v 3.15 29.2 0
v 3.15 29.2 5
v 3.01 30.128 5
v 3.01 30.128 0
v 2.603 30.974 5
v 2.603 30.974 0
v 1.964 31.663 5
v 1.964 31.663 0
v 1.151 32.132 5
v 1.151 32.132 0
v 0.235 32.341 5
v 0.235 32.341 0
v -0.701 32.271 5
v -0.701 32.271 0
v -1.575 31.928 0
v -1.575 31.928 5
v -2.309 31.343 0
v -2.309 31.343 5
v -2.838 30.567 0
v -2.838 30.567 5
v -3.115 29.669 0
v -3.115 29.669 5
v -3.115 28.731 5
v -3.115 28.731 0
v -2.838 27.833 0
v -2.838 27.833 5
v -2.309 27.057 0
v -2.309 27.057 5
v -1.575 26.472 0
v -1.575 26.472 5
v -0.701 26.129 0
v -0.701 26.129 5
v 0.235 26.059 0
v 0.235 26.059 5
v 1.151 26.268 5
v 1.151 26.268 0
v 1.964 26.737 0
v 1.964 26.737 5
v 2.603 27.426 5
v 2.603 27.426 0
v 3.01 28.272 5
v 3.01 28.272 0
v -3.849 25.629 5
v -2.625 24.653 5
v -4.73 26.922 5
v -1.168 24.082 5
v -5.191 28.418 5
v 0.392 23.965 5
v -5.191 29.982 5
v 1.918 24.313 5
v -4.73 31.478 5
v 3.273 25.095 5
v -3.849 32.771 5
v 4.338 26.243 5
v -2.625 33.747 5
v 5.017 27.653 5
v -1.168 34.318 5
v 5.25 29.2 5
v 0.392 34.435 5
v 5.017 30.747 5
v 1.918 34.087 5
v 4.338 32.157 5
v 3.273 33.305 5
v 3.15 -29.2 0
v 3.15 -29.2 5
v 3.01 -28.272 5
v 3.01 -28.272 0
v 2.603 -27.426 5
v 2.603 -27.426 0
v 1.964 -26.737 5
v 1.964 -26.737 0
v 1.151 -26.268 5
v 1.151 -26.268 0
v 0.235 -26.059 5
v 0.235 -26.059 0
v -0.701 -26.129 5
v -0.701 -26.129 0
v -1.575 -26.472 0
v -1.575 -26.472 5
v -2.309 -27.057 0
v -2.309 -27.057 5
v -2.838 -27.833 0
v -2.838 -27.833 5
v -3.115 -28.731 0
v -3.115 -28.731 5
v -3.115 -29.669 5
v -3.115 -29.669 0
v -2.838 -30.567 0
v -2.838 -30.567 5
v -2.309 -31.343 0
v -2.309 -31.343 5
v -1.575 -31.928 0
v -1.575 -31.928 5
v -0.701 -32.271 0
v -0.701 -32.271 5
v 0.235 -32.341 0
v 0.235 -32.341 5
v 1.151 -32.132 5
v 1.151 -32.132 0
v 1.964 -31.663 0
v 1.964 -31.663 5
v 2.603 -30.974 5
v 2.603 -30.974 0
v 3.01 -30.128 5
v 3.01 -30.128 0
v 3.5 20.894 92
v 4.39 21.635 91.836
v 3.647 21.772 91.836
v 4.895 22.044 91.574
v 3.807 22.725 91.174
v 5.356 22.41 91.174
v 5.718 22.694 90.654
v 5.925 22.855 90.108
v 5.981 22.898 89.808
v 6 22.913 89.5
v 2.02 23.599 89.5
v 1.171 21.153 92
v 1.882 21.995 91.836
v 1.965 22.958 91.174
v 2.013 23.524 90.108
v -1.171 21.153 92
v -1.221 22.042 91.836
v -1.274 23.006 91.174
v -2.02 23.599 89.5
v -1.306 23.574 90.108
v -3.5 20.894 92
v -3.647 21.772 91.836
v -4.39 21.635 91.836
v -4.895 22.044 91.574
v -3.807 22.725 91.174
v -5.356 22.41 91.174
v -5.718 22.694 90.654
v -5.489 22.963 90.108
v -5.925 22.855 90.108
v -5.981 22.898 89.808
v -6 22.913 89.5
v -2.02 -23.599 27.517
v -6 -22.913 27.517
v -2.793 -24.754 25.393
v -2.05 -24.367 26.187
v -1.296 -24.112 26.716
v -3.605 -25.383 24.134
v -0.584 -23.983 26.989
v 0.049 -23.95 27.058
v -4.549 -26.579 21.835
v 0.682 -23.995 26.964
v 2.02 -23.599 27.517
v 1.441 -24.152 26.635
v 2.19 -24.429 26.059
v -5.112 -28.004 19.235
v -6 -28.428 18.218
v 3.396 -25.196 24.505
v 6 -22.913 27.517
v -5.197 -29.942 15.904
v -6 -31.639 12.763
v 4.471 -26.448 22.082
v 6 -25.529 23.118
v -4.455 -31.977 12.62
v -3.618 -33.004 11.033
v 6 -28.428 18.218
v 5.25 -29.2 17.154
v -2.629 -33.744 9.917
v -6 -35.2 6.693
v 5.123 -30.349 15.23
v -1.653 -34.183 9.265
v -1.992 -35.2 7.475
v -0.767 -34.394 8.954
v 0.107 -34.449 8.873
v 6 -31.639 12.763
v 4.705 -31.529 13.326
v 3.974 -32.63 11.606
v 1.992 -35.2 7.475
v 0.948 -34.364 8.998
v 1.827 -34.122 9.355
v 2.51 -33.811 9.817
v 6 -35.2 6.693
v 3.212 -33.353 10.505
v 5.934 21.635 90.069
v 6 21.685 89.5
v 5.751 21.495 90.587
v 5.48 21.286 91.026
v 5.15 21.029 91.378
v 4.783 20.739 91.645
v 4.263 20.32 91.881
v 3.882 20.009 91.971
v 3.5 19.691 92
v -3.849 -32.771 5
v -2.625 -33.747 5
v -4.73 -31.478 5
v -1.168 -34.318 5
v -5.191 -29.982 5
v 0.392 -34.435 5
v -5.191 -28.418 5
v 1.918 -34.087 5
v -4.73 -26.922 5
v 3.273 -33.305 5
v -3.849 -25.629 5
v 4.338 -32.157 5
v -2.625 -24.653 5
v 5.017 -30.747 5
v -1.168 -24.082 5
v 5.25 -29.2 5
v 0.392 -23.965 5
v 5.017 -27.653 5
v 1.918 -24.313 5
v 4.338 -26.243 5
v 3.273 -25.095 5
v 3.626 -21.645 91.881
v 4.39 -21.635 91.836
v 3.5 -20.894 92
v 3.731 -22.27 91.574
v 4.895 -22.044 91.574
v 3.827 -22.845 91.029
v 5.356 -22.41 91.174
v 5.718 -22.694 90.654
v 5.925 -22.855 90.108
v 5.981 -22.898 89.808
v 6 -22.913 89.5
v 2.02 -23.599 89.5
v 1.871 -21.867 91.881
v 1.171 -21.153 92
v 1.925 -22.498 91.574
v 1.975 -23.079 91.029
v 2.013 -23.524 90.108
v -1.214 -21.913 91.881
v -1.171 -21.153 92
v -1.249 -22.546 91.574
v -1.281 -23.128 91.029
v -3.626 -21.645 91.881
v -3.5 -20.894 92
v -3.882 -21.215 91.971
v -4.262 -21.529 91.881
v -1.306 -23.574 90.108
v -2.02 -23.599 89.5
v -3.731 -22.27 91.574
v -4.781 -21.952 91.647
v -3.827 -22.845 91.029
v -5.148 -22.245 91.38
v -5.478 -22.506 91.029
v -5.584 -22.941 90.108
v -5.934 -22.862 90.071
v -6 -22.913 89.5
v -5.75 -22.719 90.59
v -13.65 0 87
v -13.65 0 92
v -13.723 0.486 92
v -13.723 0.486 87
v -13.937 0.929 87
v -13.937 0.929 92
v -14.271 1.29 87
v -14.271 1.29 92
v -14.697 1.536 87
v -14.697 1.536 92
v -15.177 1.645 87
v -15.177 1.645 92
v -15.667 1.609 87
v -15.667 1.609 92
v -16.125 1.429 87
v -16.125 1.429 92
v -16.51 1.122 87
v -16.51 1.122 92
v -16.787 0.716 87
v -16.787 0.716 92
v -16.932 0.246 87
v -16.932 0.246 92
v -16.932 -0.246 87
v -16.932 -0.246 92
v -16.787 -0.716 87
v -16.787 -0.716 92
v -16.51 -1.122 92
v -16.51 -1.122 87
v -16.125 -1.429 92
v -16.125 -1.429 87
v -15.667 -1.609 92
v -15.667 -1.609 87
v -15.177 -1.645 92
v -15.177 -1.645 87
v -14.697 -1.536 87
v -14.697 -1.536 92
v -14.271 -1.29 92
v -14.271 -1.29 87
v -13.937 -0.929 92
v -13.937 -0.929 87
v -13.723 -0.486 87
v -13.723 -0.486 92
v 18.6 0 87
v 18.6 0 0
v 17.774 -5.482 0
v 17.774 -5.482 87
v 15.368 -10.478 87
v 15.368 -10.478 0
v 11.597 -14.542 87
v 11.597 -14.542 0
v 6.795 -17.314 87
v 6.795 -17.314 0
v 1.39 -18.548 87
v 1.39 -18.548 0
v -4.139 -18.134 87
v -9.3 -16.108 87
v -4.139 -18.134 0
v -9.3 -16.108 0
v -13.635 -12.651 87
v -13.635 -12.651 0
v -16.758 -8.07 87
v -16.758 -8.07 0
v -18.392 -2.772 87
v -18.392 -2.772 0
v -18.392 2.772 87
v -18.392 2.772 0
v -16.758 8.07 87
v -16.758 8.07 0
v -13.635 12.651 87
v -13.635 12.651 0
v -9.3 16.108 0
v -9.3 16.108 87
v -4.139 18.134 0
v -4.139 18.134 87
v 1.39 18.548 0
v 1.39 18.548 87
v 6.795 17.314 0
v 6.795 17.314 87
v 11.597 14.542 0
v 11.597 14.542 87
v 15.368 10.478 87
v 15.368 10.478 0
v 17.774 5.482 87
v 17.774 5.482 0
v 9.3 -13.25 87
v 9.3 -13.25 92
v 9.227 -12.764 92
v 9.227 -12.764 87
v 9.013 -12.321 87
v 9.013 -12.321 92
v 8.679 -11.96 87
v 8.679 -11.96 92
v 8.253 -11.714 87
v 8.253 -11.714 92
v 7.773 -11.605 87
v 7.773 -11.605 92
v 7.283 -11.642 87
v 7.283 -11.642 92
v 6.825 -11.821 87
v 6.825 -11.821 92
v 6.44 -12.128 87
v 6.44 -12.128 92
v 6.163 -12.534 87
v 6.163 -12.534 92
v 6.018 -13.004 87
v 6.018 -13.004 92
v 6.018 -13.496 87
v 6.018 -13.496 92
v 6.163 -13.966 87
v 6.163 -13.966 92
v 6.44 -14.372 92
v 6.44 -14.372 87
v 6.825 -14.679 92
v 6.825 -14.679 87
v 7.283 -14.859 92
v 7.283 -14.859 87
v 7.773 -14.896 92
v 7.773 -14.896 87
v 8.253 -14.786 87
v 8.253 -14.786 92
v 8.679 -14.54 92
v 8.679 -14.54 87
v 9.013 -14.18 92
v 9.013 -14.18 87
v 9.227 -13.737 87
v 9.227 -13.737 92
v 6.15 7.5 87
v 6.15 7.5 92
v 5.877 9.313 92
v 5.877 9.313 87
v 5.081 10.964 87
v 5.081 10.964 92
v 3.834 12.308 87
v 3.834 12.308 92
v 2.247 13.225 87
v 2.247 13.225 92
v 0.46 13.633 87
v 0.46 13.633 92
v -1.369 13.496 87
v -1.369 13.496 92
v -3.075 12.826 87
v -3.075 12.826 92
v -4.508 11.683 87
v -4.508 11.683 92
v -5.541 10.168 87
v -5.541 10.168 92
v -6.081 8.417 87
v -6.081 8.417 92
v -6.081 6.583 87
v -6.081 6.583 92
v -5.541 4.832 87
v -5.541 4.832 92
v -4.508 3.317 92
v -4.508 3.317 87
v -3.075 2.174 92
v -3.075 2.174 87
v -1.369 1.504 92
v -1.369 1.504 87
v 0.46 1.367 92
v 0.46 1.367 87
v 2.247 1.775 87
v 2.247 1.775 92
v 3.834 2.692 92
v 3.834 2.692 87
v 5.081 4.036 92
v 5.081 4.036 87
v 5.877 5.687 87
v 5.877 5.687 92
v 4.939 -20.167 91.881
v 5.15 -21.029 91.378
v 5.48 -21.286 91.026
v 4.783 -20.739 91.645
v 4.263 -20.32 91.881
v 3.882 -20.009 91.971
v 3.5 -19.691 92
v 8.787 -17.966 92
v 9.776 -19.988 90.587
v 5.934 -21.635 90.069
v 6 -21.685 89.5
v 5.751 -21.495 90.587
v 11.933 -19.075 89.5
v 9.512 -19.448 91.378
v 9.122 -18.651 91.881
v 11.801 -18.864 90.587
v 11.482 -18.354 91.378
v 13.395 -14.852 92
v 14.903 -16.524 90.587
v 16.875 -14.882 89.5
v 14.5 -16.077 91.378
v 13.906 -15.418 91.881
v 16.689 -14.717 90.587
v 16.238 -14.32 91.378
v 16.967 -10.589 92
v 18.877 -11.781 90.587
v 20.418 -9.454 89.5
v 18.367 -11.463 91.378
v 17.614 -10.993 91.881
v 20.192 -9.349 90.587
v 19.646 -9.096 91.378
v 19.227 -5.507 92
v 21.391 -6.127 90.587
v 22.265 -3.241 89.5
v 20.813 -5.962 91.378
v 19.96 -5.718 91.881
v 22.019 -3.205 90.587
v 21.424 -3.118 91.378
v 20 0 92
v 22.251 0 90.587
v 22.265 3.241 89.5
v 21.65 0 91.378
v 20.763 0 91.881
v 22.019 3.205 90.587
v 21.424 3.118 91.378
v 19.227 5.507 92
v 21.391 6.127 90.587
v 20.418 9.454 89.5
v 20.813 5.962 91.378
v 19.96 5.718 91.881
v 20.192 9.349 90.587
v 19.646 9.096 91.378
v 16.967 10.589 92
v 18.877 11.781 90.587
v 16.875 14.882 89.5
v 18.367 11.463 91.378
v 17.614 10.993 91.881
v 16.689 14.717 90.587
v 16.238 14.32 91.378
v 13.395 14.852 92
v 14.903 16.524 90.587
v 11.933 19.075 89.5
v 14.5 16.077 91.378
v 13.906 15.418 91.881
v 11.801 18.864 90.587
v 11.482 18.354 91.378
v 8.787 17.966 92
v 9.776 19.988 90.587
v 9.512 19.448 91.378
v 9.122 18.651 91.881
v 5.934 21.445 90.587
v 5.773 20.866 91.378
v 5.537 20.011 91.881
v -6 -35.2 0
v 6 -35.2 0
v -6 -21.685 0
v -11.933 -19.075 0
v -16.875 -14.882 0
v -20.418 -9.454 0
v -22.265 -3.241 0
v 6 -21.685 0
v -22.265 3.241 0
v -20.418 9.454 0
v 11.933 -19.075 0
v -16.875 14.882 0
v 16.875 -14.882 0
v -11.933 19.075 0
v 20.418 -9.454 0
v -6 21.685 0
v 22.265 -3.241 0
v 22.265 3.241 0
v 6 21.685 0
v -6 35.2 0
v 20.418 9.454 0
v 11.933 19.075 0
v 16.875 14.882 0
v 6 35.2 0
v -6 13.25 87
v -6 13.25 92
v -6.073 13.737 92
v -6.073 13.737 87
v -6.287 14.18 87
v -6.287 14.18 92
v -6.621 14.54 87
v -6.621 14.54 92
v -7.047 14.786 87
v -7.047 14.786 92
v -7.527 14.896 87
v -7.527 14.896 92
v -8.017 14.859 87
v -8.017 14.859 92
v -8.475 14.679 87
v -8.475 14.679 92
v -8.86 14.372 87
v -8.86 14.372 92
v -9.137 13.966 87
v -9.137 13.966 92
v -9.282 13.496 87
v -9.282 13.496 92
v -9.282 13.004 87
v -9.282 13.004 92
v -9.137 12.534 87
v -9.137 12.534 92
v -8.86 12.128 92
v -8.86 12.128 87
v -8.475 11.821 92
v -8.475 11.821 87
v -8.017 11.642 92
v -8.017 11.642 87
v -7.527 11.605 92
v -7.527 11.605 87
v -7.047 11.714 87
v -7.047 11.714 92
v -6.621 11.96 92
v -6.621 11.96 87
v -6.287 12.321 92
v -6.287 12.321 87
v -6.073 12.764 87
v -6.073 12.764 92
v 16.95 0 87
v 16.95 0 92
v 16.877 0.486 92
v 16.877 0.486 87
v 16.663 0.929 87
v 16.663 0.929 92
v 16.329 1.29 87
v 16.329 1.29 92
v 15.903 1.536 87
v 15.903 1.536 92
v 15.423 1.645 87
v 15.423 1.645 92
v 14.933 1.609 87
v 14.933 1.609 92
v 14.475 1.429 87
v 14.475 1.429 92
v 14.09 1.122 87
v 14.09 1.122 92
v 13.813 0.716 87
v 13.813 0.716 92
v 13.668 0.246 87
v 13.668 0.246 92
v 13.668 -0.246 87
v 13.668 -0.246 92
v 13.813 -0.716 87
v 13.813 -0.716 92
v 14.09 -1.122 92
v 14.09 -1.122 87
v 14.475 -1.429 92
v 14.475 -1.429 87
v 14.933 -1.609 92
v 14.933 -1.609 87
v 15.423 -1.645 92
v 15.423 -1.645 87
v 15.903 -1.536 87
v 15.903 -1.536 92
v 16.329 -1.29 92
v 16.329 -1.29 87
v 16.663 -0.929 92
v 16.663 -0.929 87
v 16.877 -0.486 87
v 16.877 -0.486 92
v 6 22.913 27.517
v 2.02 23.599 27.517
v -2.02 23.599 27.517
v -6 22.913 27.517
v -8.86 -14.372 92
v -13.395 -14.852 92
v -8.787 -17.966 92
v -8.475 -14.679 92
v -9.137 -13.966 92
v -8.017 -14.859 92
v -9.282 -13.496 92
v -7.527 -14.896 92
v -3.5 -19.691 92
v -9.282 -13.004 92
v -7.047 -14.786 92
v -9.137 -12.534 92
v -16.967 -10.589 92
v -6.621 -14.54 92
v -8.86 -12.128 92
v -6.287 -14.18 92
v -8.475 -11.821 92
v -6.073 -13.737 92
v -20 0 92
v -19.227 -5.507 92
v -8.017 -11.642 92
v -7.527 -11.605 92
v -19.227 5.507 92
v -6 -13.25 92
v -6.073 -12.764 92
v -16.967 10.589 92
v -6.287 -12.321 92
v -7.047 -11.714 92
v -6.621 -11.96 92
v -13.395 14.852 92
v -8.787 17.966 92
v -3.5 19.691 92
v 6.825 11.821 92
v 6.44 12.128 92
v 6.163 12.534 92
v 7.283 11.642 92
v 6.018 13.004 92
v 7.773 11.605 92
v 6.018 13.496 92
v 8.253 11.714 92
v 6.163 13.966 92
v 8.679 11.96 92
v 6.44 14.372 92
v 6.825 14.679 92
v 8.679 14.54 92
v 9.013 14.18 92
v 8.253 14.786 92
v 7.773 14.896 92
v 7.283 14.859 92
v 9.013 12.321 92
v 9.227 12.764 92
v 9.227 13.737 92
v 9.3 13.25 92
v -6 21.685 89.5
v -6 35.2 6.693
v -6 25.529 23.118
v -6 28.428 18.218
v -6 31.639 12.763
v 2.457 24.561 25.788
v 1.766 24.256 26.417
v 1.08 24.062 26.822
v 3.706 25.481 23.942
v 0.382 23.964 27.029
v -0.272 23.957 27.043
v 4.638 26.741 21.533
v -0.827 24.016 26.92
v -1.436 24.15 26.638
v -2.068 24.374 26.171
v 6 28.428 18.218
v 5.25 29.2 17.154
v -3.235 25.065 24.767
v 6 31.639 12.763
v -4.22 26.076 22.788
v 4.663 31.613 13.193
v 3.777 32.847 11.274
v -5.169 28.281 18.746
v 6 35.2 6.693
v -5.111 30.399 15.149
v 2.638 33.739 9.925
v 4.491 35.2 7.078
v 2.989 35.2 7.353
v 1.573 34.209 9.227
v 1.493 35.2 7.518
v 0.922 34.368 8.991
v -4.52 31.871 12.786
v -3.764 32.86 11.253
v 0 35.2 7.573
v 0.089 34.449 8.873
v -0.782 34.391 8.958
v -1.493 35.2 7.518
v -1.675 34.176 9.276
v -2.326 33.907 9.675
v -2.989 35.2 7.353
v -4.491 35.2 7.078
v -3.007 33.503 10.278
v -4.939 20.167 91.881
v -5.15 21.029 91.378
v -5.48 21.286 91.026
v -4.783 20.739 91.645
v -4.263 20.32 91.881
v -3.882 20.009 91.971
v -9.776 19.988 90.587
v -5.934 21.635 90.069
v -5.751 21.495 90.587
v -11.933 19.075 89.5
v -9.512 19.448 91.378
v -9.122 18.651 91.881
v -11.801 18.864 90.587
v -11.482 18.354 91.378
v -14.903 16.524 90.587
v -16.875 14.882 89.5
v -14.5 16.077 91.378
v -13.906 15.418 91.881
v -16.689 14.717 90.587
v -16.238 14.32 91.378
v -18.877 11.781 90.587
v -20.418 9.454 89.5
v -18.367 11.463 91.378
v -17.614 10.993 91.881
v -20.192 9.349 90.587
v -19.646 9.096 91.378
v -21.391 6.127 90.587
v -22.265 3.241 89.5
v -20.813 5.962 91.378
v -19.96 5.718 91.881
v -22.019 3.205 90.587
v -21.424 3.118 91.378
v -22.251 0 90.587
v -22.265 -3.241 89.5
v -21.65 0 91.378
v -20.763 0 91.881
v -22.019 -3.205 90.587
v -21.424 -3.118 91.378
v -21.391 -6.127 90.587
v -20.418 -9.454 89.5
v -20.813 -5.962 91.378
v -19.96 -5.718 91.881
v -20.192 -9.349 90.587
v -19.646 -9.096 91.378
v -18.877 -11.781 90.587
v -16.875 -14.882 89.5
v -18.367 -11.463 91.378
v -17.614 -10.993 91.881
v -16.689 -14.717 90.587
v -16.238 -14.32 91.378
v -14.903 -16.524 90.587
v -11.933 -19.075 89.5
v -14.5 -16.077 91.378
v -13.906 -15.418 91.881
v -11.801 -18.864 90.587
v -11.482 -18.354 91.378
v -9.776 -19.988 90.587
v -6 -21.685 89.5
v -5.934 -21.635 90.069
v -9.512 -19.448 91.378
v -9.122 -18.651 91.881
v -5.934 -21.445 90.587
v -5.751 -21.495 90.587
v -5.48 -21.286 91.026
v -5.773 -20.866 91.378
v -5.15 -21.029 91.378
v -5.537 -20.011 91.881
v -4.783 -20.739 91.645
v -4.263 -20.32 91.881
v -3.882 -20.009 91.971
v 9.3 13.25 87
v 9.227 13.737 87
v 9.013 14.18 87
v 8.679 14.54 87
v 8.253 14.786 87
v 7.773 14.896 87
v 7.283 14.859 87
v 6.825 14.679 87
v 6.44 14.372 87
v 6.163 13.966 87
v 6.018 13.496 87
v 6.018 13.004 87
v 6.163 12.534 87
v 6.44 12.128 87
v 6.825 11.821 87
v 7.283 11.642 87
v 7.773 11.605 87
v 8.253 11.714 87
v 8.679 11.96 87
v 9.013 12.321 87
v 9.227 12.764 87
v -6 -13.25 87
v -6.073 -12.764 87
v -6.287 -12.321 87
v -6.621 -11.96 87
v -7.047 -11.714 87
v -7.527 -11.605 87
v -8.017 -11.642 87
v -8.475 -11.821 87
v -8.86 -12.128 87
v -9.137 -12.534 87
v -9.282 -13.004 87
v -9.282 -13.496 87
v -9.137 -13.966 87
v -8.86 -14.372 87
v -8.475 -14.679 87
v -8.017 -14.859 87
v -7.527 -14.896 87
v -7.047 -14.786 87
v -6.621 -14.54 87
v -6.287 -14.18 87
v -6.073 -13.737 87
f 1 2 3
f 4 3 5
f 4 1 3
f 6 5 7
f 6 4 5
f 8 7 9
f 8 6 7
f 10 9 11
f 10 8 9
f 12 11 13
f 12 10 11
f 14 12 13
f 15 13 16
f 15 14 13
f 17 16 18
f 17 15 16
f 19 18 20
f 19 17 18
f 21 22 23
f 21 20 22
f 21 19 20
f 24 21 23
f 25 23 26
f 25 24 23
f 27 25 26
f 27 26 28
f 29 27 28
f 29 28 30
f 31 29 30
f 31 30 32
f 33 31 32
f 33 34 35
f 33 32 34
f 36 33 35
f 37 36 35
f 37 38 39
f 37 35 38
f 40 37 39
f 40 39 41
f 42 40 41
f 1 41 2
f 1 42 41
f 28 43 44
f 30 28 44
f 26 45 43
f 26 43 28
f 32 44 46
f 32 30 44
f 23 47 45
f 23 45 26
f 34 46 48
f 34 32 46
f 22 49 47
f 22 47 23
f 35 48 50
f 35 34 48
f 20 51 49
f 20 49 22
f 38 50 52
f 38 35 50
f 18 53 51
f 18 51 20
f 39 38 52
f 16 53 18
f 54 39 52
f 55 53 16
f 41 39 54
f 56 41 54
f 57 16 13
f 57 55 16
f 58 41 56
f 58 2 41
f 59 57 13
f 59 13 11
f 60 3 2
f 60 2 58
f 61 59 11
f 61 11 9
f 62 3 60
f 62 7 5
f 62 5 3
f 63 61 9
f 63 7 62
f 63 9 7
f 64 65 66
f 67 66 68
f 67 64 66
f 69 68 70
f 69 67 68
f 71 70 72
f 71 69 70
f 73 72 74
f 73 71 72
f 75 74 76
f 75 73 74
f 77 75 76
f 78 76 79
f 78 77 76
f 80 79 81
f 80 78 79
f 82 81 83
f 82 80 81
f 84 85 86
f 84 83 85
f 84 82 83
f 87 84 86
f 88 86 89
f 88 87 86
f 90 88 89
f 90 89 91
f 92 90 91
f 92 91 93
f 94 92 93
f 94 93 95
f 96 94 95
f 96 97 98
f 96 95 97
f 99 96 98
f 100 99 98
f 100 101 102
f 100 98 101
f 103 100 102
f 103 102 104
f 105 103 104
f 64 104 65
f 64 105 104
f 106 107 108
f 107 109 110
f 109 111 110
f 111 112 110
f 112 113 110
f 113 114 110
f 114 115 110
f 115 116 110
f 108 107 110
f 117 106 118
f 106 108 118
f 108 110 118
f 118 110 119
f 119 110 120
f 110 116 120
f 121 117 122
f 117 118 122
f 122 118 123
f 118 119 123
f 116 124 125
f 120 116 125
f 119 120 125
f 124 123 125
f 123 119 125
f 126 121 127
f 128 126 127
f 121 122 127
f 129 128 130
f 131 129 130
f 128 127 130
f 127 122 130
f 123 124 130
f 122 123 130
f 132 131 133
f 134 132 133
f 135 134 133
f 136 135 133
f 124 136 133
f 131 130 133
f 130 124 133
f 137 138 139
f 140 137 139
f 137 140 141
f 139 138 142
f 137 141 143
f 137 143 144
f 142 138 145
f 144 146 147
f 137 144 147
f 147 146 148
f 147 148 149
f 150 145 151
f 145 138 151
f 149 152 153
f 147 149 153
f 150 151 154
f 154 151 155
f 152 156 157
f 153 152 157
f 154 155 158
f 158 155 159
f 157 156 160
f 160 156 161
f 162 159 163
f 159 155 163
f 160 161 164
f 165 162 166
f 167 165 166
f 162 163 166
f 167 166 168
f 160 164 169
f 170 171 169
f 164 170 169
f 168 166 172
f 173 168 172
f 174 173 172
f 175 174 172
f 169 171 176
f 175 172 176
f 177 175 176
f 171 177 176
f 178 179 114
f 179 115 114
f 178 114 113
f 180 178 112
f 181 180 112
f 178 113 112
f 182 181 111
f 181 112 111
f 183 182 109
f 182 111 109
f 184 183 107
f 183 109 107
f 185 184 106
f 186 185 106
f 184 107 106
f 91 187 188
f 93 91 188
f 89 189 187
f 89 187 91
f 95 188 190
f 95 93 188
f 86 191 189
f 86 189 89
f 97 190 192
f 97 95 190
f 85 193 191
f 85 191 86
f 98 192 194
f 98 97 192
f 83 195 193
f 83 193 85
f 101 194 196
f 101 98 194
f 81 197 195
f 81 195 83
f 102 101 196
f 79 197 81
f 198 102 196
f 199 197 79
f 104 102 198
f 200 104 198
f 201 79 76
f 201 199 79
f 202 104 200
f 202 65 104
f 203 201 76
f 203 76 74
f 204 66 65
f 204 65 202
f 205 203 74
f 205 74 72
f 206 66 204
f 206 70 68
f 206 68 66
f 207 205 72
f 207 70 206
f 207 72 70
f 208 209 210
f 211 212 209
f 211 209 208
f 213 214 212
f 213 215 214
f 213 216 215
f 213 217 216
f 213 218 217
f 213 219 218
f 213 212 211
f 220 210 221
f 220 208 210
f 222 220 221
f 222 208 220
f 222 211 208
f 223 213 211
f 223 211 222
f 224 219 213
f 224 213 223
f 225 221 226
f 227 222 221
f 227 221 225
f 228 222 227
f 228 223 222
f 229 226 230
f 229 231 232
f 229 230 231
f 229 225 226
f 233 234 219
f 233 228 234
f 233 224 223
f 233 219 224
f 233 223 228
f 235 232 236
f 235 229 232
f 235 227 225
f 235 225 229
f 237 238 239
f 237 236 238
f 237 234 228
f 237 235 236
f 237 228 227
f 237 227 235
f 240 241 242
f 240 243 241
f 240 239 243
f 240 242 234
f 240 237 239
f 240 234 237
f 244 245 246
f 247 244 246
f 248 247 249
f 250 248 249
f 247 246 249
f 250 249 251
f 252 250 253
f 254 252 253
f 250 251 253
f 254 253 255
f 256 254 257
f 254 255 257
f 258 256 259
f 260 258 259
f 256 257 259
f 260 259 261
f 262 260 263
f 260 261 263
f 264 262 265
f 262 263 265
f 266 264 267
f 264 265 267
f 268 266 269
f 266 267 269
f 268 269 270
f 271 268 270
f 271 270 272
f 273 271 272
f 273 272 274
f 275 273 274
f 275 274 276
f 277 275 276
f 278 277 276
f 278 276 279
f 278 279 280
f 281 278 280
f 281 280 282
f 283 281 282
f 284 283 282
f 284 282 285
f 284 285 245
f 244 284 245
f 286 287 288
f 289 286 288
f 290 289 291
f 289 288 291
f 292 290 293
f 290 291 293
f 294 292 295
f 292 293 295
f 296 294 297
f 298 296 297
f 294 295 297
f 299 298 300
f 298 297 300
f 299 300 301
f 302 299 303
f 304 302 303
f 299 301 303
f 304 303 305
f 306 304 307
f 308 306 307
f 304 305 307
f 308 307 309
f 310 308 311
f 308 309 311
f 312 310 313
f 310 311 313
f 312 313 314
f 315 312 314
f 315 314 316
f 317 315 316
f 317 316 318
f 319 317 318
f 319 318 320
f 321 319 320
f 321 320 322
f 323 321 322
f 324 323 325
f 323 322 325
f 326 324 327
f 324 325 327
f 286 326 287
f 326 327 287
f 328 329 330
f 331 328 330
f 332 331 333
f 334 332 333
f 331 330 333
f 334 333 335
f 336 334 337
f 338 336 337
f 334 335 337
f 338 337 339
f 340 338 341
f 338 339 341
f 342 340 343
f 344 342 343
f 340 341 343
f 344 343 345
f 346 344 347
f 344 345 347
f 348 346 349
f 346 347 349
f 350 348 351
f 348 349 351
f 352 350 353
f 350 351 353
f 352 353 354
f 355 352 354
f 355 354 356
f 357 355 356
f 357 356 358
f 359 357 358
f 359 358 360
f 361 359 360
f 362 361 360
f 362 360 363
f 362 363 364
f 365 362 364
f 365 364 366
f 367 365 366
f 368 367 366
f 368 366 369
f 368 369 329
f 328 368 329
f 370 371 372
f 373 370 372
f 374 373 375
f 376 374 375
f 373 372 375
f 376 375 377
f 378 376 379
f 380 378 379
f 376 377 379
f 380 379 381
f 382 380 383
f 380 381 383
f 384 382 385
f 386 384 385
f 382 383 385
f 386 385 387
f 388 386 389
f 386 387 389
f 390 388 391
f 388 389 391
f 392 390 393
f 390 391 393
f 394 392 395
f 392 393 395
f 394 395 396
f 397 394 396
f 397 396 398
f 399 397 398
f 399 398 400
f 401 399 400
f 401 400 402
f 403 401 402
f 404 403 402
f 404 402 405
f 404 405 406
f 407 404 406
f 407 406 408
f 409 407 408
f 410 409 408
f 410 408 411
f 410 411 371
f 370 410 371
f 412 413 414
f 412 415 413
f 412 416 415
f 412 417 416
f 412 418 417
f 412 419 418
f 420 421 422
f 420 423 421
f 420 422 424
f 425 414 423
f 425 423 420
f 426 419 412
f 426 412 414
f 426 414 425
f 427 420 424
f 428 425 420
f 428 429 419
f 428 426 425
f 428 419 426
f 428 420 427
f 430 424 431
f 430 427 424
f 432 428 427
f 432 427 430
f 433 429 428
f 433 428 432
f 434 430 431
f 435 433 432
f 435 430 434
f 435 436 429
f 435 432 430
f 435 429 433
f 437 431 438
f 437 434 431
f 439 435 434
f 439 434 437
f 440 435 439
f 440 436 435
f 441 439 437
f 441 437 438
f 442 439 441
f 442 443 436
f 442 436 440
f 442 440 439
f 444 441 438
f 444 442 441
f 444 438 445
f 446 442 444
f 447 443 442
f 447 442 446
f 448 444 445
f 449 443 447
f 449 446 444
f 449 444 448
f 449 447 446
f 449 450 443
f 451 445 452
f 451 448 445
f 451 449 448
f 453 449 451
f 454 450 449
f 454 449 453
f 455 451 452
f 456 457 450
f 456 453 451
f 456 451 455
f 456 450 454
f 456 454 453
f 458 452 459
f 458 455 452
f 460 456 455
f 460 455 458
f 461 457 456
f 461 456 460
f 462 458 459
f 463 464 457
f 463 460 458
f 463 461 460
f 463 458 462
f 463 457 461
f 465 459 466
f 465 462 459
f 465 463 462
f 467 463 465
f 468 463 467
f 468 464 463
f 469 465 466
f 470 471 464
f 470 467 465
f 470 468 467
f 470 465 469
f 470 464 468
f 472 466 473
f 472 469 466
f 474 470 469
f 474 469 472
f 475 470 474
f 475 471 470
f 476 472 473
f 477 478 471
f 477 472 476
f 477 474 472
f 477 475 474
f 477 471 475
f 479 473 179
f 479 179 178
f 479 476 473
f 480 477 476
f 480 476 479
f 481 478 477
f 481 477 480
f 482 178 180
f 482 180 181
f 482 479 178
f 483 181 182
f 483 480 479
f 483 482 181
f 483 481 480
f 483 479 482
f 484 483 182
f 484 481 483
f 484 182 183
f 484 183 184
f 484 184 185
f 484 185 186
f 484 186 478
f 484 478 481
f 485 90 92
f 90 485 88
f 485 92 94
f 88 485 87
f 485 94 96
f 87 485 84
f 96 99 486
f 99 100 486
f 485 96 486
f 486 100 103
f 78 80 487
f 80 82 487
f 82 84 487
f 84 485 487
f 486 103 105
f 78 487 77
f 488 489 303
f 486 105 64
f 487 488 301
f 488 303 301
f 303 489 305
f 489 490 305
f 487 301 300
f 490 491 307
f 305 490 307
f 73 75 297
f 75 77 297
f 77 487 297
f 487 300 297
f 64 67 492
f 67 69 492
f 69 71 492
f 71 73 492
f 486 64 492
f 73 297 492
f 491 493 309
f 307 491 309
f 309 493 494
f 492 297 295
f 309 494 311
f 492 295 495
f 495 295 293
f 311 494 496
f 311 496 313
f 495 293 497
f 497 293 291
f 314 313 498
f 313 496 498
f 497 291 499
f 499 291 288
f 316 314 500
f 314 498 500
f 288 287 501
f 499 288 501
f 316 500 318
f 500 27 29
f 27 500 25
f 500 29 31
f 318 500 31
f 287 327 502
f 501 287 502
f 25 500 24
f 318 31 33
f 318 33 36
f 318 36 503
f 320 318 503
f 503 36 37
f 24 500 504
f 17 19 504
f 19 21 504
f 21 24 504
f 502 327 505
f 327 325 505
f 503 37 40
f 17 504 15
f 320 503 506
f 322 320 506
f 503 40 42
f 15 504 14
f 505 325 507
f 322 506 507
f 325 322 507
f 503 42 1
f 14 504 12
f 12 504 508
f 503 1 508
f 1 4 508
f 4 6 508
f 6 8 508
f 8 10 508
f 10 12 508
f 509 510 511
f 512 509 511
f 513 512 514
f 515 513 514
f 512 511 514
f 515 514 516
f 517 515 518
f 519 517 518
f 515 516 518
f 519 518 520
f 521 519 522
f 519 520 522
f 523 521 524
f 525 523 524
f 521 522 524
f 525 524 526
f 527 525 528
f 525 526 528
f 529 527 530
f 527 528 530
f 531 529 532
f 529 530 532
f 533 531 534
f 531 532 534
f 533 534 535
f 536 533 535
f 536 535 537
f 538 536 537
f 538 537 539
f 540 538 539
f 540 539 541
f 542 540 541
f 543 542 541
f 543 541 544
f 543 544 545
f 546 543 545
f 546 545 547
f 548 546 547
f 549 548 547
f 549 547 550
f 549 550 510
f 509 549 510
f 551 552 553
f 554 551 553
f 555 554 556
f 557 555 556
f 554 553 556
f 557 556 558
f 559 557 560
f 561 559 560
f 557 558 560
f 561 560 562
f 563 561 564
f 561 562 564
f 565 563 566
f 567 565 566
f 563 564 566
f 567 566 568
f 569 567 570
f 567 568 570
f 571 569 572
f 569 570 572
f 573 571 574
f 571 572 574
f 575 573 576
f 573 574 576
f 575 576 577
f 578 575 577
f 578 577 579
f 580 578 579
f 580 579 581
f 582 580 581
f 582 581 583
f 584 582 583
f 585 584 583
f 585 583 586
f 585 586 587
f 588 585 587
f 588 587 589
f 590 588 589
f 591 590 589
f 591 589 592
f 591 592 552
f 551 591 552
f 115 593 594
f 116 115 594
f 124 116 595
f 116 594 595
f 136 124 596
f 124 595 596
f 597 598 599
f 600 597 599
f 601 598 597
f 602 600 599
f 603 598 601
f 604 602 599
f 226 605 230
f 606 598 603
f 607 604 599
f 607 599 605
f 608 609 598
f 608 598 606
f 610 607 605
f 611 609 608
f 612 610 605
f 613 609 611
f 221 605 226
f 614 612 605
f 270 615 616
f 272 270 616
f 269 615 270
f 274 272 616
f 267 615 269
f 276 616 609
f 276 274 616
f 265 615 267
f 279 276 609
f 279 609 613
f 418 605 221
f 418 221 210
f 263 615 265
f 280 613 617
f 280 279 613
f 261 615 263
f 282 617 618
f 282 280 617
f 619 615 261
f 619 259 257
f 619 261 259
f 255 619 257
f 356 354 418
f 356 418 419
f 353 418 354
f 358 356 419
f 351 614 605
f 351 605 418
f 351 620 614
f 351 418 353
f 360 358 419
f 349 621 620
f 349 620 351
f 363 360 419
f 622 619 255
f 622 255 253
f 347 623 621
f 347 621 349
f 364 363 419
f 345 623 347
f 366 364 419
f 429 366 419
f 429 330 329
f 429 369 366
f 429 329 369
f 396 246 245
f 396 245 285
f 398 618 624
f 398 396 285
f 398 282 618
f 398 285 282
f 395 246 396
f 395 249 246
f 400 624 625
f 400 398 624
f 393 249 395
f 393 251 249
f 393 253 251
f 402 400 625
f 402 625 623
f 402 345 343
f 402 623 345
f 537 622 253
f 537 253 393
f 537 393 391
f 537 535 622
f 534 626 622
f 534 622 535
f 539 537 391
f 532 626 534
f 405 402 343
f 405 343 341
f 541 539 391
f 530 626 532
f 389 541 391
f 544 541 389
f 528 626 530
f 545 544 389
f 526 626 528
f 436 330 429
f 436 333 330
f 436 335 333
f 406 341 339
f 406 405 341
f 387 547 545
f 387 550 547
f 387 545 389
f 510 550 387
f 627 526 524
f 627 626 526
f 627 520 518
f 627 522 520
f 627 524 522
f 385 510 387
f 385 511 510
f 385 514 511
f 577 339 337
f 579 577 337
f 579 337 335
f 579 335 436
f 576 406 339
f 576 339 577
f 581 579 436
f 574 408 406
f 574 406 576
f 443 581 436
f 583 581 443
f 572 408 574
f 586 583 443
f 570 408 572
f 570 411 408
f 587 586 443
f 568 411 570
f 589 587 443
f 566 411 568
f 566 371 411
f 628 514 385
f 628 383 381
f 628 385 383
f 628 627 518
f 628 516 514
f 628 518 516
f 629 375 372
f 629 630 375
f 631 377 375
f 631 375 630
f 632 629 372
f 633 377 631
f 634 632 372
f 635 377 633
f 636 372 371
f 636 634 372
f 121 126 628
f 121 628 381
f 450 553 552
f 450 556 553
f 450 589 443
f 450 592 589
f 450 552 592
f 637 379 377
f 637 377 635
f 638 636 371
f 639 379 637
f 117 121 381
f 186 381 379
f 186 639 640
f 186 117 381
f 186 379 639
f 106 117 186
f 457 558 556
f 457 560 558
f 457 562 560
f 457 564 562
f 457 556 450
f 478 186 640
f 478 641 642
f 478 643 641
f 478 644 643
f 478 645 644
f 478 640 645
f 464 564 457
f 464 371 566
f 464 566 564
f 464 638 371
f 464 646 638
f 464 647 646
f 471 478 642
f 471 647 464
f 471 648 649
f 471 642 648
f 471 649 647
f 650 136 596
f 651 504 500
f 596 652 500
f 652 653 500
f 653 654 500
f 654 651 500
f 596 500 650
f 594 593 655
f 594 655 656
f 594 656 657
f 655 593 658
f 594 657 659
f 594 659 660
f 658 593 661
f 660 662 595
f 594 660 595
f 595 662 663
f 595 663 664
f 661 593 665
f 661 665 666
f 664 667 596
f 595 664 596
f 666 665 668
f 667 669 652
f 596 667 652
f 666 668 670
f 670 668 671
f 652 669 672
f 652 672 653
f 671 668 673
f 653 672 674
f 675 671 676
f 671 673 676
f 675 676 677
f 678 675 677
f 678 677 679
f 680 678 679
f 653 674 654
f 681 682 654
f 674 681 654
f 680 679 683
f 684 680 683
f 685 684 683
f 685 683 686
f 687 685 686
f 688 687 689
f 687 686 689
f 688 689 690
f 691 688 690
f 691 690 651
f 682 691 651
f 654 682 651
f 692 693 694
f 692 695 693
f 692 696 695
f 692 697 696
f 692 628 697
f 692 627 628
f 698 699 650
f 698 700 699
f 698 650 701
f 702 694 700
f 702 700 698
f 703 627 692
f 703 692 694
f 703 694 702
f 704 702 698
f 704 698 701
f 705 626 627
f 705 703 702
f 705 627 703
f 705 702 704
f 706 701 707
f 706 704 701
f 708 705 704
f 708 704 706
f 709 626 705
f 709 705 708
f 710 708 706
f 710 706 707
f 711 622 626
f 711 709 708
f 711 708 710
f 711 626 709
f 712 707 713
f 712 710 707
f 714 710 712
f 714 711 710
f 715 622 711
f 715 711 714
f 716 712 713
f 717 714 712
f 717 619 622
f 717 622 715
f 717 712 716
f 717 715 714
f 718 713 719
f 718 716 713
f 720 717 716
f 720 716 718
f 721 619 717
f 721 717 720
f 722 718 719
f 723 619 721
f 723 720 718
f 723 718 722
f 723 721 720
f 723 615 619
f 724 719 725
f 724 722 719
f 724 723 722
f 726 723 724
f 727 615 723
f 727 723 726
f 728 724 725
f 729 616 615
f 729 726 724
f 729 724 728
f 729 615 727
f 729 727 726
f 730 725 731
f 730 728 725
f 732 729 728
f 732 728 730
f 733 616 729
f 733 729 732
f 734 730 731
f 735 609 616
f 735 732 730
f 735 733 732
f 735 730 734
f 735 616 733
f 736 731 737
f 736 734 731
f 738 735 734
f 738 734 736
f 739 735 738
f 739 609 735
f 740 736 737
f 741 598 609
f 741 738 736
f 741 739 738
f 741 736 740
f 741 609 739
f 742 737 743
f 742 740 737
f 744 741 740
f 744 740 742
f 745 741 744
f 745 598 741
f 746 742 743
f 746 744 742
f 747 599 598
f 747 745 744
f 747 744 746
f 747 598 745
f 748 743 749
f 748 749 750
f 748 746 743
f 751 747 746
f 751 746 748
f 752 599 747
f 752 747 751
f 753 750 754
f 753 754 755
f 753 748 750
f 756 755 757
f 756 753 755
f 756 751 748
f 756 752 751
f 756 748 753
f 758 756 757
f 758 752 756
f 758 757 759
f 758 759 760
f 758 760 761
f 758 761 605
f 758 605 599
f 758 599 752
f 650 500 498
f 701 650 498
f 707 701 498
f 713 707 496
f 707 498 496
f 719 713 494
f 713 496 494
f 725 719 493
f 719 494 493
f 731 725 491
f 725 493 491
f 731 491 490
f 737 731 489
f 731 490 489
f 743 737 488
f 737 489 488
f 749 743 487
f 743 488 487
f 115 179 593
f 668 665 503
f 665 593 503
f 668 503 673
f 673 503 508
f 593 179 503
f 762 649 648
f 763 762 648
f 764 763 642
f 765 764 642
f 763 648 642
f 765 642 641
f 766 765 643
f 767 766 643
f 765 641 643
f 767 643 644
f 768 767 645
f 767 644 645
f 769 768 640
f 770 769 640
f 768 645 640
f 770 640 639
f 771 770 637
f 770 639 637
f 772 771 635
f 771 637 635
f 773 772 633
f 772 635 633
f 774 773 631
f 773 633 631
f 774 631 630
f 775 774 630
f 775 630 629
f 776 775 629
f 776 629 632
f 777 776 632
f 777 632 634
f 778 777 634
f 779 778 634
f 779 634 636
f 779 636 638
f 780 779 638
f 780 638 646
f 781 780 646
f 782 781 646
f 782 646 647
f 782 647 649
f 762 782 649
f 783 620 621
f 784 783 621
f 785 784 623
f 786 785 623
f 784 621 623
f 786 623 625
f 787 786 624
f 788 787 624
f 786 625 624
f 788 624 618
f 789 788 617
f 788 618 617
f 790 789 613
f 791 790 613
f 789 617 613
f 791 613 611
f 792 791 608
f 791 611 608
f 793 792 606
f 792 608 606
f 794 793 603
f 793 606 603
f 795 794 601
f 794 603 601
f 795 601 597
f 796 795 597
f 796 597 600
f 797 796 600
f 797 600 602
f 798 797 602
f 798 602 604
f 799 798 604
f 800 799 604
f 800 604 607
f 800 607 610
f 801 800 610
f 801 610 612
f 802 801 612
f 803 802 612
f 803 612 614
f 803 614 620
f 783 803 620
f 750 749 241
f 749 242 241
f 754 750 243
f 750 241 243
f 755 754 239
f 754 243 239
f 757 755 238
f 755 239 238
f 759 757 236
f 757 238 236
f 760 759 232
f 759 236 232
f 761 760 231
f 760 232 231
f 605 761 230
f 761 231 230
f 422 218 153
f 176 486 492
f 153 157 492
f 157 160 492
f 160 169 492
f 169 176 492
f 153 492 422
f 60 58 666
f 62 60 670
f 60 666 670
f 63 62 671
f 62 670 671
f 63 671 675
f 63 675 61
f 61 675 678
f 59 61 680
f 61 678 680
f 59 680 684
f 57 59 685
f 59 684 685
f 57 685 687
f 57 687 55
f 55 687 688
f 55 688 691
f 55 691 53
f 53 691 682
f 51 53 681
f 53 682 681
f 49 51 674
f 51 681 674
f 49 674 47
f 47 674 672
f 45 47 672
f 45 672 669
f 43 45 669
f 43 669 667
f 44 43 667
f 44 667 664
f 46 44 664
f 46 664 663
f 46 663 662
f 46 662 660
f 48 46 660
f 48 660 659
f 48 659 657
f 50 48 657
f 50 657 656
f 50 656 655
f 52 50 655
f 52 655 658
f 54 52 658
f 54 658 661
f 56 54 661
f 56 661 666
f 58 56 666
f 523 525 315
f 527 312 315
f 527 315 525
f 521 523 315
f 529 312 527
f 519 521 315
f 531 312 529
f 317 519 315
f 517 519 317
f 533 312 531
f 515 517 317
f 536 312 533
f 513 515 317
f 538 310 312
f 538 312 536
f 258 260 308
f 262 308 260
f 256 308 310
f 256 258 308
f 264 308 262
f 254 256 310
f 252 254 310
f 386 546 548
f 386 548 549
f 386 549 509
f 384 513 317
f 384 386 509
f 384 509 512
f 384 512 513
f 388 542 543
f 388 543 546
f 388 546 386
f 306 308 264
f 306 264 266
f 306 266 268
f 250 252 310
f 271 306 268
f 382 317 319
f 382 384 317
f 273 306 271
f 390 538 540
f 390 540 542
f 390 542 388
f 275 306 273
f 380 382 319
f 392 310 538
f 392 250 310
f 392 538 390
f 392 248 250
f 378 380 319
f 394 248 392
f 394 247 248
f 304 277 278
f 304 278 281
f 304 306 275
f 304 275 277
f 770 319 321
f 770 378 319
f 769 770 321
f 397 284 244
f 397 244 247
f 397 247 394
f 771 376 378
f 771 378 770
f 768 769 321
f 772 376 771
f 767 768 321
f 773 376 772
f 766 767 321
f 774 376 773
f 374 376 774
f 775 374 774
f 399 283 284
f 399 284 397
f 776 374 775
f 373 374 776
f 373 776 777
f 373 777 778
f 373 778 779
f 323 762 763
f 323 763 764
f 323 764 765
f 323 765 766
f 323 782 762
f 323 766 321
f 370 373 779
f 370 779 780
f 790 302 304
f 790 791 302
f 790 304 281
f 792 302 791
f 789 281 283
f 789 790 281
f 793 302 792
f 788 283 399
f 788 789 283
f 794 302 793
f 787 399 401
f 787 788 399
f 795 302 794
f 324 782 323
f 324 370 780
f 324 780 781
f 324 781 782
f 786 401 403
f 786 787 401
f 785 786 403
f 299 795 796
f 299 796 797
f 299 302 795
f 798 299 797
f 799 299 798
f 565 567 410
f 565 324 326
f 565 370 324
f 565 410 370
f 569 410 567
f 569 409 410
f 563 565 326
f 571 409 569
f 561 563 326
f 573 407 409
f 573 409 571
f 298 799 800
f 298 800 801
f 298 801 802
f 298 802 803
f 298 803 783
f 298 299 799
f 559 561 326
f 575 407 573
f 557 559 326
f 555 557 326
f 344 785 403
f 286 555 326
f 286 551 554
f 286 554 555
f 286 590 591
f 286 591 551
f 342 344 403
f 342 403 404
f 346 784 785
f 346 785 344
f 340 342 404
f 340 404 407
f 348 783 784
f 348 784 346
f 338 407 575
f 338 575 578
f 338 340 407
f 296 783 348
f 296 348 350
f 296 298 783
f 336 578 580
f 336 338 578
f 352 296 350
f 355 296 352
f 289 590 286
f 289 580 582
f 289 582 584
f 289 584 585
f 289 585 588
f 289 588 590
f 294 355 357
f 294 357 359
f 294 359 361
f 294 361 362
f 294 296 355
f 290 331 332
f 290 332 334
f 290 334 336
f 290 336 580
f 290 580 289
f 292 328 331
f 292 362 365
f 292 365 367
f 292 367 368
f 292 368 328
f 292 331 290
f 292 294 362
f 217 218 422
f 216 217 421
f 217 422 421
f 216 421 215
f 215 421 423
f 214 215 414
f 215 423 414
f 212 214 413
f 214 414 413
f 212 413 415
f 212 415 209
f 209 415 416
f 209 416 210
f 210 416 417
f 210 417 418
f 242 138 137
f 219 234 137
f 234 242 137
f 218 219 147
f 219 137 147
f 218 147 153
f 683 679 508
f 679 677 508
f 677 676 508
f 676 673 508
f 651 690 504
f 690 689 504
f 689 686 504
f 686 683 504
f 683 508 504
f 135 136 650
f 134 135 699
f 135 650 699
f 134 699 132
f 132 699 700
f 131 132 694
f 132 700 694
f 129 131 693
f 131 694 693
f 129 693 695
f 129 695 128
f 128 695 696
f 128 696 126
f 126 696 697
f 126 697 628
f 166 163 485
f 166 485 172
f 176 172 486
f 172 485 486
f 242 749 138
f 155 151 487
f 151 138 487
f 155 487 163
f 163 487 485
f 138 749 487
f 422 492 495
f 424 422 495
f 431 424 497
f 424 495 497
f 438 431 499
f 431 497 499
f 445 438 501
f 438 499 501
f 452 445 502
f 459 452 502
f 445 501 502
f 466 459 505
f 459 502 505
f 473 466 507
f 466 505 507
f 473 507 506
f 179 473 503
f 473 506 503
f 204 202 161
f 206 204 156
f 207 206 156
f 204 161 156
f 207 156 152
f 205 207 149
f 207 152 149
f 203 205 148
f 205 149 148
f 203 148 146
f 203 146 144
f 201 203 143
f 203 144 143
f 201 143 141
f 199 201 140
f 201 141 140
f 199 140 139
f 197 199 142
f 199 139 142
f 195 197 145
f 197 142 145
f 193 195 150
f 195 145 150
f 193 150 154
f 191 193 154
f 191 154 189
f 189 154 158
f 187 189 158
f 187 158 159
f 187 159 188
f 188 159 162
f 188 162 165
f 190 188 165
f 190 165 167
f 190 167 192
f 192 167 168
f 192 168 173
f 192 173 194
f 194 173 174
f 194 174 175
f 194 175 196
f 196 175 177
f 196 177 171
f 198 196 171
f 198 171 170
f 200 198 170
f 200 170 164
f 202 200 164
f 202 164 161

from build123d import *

# Parameters (mm, degrees)
F1_R      = 3.15
F2_DEPTH  = 92
F3_R      = 18.6
F5_DEPTH  = 87
F4_R      = 6.15
F4_R_2    = 1.65
F8_DEPTH  = 92.0010001
F9_R      = 5.25
F10_DEPTH = 87
F11_R     = 2.5


with BuildPart() as f2:
    # F1 (on Top) → F2 (new body)
    with BuildSketch(Plane.XY):
        with BuildLine():
            Line((6, 35.2), (-6, 35.2))
            Line((-6, 35.2), (-6, 21.6852484422))
            ThreePointArc((-6, 21.6852484422), (0, 22.5), (6, 21.6852484422))
            Line((6, 21.6852484422), (6, 35.2))
        make_face()
        with Locations((0, 29.2)):
            Circle(F1_R, mode=Mode.SUBTRACT)
        with BuildLine():
            ThreePointArc((6, 21.6852484422), (0, 22.5), (-6, 21.6852484422))
            ThreePointArc((-6, 21.6852484422), (-22.5, 0), (-6, -21.6852484422))
            ThreePointArc((-6, -21.6852484422), (0, -22.5), (6, -21.6852484422))
            ThreePointArc((6, -21.6852484422), (17.9060045795, -13.6244265934), (22.5, 0))
            ThreePointArc((22.5, 0), (17.9060045795, 13.6244265934), (6, 21.6852484422))
        make_face()
        with BuildLine():
            ThreePointArc((6, -21.6852484422), (0, -22.5), (-6, -21.6852484422))
            Line((-6, -21.6852484422), (-6, -35.2))
            Line((-6, -35.2), (6, -35.2))
            Line((6, -35.2), (6, -21.6852484422))
        make_face()
        with Locations((0, -29.2)):
            Circle(F1_R, mode=Mode.SUBTRACT)
    extrude(amount=F2_DEPTH)

    # F3 (on face) → F5 (cut)
    with BuildSketch(Plane(origin=(0, 0, 0), x_dir=(1, 0, 0), z_dir=(0, 0, -1))):
        Circle(F3_R)
    extrude(amount=-F5_DEPTH, mode=Mode.SUBTRACT)

    # F6 (on Right) → F7 (revolve, cut)
    with BuildSketch(Plane.YZ):
        Polygon((36.6852484422, 102), (23.6852484422, 102), (23.6852484422, 27.5166604984), (36.6852484422, 5), align=None)
    revolve(axis=Axis((0, 0, 51.2388907373), (0, 0, 1)), mode=Mode.SUBTRACT)

    # F4 (on face) → F8 (cut, through all)
    with BuildSketch(Plane.XY.offset(92)):
        with Locations((0, 7.5)):
            Circle(F4_R)
        with Locations((-15.3, 0)):
            Circle(F4_R_2)
        with Locations((-7.65, -13.2501886779)):
            Circle(F4_R_2)
        with Locations((7.65, -13.2501886779)):
            Circle(F4_R_2)
        with Locations((15.3, 0)):
            Circle(F4_R_2)
        with Locations((7.65, 13.2501886779)):
            Circle(F4_R_2)
        with Locations((-7.65, 13.2501886779)):
            Circle(F4_R_2)
    extrude(amount=-F8_DEPTH, mode=Mode.SUBTRACT)

    # F9 (on face) → F10 (cut)
    with BuildSketch(Plane.XY.offset(92)):
        with Locations((0, 29.2)):
            Circle(F9_R)
        with Locations((0, -29.2)):
            Circle(F9_R)
    extrude(amount=-F10_DEPTH, mode=Mode.SUBTRACT)

    # F11
    f11_edges = [f2.edges().sort_by_distance(p)[0] for p in [
        (-22.5, 0, 92),
        (-6, -22.298965, 92),
        (0, 23.685248, 92),
        (0, -23.685248, 92),
        (6, -22.298965, 92),
        (22.5, 0, 92),
        (6, 22.298965, 92),
        (-6, 22.298965, 92),
    ]]
    fillet(f11_edges, radius=F11_R)


solid = f2.part
